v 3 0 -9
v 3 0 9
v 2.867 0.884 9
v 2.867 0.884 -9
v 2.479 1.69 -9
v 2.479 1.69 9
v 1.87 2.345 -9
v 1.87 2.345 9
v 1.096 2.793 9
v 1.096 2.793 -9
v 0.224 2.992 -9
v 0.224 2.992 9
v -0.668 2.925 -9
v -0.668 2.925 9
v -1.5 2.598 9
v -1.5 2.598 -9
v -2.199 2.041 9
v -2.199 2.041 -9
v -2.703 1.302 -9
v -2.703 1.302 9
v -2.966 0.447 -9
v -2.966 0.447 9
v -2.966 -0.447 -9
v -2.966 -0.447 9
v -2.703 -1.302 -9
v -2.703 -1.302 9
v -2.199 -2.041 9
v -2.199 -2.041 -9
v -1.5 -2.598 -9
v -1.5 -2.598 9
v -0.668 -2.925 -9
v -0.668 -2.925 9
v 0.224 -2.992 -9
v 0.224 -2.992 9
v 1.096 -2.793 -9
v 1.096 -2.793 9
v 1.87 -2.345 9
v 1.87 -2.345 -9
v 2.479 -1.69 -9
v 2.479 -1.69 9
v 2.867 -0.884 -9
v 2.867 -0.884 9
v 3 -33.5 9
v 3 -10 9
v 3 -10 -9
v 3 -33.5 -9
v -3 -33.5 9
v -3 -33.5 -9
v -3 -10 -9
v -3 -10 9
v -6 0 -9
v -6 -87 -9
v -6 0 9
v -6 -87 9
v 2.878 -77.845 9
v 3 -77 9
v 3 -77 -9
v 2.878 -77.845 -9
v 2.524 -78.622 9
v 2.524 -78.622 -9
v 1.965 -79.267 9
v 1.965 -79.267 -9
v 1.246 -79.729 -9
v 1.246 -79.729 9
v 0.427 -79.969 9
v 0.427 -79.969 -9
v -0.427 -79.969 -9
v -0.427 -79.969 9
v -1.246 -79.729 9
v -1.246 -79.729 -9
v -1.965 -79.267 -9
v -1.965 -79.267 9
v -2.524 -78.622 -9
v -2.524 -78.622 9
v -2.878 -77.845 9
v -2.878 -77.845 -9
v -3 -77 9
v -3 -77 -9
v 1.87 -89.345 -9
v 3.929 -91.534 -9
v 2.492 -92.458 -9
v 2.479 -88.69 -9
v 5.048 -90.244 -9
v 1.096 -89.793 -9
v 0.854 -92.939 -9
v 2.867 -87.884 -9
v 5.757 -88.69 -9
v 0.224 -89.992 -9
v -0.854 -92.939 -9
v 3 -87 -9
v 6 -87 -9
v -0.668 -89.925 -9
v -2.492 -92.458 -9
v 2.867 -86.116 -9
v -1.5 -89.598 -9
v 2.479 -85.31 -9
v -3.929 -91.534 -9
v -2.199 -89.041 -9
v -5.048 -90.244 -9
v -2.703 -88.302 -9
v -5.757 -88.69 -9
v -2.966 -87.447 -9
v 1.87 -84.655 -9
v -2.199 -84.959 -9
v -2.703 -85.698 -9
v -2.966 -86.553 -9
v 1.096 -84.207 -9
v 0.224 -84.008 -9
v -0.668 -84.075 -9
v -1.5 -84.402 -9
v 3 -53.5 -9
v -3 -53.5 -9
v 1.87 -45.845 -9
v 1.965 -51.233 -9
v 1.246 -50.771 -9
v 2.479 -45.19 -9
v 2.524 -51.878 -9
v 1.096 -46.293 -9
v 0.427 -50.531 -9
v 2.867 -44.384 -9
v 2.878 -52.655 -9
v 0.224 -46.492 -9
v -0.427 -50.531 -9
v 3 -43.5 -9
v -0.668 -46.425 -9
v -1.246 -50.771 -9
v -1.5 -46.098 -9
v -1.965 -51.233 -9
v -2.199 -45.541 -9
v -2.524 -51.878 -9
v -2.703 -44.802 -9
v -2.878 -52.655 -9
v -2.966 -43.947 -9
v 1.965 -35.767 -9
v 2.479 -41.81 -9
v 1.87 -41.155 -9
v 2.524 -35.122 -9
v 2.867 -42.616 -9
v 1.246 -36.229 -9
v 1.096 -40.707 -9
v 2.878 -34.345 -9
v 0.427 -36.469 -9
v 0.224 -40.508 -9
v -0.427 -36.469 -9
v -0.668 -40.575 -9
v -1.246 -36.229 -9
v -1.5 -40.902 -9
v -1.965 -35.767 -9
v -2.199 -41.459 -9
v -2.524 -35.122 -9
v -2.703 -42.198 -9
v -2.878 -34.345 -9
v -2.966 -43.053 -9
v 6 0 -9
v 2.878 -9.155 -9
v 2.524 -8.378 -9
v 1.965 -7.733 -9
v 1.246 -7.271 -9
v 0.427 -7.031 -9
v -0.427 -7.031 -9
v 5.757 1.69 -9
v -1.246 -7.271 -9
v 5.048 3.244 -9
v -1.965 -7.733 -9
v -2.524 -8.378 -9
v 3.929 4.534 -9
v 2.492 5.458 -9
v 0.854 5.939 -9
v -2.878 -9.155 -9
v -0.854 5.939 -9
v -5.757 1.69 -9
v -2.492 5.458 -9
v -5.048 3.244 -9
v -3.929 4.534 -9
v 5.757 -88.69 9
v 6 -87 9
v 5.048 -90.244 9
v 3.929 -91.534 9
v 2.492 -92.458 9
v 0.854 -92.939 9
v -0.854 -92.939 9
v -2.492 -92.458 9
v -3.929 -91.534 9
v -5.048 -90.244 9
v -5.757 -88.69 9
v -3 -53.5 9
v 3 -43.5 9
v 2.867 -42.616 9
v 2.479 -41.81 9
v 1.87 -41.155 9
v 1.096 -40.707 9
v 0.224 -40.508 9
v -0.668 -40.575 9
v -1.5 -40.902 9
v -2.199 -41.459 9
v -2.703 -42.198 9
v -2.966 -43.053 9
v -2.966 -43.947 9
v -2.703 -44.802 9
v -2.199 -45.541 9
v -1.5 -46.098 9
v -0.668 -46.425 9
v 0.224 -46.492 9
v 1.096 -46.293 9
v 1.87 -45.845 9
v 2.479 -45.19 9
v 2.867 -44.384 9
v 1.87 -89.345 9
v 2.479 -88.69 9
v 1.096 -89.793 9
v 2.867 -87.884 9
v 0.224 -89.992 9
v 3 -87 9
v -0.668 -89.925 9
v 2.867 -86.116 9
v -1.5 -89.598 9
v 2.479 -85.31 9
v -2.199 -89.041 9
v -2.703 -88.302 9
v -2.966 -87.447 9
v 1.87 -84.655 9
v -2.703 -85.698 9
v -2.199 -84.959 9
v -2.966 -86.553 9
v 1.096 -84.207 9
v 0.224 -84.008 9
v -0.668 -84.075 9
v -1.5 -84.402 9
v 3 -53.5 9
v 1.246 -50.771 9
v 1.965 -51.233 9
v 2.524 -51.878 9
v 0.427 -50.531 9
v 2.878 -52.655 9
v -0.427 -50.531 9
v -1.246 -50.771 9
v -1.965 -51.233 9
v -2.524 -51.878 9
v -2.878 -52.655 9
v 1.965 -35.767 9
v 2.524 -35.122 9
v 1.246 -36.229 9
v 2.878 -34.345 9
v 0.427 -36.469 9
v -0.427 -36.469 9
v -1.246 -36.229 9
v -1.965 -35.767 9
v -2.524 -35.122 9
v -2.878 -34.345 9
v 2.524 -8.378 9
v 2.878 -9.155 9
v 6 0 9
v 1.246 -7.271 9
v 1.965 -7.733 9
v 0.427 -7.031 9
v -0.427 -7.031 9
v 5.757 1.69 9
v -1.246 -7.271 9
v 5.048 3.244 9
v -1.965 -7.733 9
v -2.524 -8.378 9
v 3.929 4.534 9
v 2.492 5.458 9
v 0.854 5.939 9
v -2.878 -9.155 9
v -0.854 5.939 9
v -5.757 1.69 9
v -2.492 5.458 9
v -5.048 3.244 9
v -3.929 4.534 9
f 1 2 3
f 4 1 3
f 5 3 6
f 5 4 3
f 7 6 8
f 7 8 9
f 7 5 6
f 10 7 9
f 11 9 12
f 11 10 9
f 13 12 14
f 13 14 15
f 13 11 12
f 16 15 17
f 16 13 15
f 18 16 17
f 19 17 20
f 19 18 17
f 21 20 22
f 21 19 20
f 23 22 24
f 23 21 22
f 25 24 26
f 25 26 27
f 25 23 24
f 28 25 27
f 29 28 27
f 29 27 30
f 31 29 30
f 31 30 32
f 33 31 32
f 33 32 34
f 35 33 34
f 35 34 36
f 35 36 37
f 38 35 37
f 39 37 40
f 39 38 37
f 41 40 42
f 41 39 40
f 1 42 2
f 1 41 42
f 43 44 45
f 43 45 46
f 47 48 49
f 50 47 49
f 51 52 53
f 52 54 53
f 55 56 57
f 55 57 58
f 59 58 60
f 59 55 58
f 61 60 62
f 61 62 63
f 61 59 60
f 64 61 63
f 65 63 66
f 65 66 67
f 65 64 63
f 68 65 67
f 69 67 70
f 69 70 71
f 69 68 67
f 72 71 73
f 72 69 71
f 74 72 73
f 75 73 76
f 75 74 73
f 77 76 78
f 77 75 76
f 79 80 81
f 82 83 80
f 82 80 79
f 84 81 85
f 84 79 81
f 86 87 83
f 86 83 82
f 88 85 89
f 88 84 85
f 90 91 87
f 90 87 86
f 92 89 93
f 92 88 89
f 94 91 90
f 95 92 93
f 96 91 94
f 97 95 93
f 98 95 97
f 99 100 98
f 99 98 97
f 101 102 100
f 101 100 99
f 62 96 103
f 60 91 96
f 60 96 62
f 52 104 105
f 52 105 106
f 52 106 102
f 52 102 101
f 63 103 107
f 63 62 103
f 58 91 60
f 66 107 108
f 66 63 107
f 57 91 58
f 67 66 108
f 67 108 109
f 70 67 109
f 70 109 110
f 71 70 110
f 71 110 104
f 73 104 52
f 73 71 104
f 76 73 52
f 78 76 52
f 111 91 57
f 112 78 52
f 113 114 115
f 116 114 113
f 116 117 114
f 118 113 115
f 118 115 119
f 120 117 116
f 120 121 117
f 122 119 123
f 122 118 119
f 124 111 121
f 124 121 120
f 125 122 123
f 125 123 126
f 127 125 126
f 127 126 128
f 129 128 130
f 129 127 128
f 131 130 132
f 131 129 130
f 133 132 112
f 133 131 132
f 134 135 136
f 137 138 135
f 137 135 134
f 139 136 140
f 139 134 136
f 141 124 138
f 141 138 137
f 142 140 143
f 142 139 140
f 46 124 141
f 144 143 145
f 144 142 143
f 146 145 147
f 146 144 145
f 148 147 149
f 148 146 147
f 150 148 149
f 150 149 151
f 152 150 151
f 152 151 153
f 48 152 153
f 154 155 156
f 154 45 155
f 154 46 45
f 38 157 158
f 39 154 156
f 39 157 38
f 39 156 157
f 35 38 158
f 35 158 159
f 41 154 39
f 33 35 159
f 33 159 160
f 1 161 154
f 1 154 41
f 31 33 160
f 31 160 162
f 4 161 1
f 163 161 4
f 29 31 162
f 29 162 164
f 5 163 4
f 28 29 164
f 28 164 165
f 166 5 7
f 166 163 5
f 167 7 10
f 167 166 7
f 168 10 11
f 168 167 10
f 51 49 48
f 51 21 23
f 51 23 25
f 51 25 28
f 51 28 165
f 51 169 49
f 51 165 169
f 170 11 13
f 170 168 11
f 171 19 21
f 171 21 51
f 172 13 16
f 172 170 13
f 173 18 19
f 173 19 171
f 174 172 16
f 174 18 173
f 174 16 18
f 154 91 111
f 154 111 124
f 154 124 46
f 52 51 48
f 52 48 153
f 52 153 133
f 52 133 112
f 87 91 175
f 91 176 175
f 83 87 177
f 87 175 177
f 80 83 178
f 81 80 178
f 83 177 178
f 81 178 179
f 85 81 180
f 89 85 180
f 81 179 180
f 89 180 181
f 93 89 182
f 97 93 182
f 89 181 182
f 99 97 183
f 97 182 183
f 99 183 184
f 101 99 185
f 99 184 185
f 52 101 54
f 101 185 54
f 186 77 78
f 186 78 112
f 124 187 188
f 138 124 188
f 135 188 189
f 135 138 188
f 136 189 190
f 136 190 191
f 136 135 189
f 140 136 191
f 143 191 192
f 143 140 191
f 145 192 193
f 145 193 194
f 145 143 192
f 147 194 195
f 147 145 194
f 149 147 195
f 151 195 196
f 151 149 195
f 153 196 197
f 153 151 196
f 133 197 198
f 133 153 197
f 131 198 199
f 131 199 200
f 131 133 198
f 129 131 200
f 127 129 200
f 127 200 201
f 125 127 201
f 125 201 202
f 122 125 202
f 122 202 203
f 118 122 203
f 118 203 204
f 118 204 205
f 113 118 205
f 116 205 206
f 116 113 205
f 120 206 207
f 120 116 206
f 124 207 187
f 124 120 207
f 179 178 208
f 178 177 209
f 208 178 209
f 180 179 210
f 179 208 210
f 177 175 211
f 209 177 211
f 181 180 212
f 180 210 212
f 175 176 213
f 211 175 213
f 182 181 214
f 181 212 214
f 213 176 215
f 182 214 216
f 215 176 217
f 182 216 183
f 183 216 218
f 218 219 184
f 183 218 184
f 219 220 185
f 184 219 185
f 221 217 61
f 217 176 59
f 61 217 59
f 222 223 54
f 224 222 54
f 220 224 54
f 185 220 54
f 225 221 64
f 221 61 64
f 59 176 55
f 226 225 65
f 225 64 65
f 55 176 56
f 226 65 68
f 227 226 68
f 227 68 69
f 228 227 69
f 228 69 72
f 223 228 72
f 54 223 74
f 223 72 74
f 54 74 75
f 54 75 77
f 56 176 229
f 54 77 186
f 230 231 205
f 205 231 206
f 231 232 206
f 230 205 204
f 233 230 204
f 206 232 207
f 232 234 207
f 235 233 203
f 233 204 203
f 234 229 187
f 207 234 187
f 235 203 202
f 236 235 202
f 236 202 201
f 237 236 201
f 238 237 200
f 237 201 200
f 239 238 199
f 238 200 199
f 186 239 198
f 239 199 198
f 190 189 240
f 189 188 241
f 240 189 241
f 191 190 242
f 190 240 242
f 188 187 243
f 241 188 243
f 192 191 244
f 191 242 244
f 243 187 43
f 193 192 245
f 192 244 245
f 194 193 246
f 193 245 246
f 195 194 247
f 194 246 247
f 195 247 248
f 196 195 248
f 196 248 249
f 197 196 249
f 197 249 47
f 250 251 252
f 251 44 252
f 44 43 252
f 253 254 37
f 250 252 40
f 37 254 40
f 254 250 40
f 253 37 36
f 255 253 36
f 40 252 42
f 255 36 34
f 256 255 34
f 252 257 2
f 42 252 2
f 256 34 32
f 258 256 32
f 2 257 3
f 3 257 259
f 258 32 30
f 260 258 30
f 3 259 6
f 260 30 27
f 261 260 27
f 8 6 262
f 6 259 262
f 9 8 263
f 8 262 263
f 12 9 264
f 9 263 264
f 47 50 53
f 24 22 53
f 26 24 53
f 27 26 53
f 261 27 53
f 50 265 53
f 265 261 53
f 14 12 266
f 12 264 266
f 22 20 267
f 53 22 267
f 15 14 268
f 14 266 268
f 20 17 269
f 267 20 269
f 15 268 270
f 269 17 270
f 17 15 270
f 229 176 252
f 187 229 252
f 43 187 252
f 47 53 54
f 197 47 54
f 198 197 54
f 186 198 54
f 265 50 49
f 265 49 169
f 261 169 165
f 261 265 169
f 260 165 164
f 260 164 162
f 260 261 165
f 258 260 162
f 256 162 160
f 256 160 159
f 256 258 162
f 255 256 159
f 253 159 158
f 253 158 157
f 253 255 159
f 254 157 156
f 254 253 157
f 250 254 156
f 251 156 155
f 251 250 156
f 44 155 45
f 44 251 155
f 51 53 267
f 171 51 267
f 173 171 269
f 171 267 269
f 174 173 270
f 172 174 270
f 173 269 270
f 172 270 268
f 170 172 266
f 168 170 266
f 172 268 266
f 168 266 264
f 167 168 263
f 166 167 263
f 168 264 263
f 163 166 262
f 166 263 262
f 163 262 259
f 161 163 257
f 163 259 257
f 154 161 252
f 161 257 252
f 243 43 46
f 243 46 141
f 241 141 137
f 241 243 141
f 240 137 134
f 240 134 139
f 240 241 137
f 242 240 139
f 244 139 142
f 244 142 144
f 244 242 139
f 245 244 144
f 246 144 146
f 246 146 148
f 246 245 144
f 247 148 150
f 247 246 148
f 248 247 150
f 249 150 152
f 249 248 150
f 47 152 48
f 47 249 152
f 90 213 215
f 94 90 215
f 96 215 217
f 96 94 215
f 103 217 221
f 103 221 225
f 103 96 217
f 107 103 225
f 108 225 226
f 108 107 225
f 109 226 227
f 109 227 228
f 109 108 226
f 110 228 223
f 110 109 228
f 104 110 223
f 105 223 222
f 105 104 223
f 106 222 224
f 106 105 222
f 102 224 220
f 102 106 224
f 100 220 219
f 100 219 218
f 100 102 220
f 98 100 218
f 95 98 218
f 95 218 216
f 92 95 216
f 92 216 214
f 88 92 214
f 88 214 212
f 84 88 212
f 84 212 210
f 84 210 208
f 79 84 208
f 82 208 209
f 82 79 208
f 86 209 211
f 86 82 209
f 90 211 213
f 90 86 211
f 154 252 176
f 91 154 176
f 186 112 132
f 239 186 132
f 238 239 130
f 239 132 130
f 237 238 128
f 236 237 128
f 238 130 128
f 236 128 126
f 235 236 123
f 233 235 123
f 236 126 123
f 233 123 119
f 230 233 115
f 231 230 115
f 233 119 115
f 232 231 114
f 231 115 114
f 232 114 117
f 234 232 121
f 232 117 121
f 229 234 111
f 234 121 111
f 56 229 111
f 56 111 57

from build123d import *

# Parameters (mm, degrees)
SKETCH1_R           = 3
BOSS_EXTRUDE1_DEPTH = 9


with BuildPart() as part:
    # Sketch1 → Boss-Extrude1 (new, symmetric)
    with BuildSketch(Plane.XY):
        with BuildLine():
            Line((6, 0), (6, -87))
            ThreePointArc((6, -87), (0, -93), (-6, -87))
            Line((-6, -87), (-6, 0))
            ThreePointArc((-6, 0), (0, 6), (6, 0))
        make_face()
        with Locations((0, -87)):
            Circle(SKETCH1_R, mode=Mode.SUBTRACT)
        Circle(SKETCH1_R, mode=Mode.SUBTRACT)
        with Locations((0, -43.5)):
            Circle(SKETCH1_R, mode=Mode.SUBTRACT)
        with BuildLine():
            Line((3, -10), (3, -33.5))
            ThreePointArc((3, -33.5), (0, -36.5), (-3, -33.5))
            Line((-3, -33.5), (-3, -10))
            ThreePointArc((-3, -10), (0, -7), (3, -10))
        make_face(mode=Mode.SUBTRACT)
        with BuildLine():
            Line((3, -53.5), (3, -77))
            ThreePointArc((3, -77), (0, -80), (-3, -77))
            Line((-3, -77), (-3, -53.5))
            ThreePointArc((-3, -53.5), (0, -50.5), (3, -53.5))
        make_face(mode=Mode.SUBTRACT)
    extrude(amount=BOSS_EXTRUDE1_DEPTH, both=True)


solid = part.part
